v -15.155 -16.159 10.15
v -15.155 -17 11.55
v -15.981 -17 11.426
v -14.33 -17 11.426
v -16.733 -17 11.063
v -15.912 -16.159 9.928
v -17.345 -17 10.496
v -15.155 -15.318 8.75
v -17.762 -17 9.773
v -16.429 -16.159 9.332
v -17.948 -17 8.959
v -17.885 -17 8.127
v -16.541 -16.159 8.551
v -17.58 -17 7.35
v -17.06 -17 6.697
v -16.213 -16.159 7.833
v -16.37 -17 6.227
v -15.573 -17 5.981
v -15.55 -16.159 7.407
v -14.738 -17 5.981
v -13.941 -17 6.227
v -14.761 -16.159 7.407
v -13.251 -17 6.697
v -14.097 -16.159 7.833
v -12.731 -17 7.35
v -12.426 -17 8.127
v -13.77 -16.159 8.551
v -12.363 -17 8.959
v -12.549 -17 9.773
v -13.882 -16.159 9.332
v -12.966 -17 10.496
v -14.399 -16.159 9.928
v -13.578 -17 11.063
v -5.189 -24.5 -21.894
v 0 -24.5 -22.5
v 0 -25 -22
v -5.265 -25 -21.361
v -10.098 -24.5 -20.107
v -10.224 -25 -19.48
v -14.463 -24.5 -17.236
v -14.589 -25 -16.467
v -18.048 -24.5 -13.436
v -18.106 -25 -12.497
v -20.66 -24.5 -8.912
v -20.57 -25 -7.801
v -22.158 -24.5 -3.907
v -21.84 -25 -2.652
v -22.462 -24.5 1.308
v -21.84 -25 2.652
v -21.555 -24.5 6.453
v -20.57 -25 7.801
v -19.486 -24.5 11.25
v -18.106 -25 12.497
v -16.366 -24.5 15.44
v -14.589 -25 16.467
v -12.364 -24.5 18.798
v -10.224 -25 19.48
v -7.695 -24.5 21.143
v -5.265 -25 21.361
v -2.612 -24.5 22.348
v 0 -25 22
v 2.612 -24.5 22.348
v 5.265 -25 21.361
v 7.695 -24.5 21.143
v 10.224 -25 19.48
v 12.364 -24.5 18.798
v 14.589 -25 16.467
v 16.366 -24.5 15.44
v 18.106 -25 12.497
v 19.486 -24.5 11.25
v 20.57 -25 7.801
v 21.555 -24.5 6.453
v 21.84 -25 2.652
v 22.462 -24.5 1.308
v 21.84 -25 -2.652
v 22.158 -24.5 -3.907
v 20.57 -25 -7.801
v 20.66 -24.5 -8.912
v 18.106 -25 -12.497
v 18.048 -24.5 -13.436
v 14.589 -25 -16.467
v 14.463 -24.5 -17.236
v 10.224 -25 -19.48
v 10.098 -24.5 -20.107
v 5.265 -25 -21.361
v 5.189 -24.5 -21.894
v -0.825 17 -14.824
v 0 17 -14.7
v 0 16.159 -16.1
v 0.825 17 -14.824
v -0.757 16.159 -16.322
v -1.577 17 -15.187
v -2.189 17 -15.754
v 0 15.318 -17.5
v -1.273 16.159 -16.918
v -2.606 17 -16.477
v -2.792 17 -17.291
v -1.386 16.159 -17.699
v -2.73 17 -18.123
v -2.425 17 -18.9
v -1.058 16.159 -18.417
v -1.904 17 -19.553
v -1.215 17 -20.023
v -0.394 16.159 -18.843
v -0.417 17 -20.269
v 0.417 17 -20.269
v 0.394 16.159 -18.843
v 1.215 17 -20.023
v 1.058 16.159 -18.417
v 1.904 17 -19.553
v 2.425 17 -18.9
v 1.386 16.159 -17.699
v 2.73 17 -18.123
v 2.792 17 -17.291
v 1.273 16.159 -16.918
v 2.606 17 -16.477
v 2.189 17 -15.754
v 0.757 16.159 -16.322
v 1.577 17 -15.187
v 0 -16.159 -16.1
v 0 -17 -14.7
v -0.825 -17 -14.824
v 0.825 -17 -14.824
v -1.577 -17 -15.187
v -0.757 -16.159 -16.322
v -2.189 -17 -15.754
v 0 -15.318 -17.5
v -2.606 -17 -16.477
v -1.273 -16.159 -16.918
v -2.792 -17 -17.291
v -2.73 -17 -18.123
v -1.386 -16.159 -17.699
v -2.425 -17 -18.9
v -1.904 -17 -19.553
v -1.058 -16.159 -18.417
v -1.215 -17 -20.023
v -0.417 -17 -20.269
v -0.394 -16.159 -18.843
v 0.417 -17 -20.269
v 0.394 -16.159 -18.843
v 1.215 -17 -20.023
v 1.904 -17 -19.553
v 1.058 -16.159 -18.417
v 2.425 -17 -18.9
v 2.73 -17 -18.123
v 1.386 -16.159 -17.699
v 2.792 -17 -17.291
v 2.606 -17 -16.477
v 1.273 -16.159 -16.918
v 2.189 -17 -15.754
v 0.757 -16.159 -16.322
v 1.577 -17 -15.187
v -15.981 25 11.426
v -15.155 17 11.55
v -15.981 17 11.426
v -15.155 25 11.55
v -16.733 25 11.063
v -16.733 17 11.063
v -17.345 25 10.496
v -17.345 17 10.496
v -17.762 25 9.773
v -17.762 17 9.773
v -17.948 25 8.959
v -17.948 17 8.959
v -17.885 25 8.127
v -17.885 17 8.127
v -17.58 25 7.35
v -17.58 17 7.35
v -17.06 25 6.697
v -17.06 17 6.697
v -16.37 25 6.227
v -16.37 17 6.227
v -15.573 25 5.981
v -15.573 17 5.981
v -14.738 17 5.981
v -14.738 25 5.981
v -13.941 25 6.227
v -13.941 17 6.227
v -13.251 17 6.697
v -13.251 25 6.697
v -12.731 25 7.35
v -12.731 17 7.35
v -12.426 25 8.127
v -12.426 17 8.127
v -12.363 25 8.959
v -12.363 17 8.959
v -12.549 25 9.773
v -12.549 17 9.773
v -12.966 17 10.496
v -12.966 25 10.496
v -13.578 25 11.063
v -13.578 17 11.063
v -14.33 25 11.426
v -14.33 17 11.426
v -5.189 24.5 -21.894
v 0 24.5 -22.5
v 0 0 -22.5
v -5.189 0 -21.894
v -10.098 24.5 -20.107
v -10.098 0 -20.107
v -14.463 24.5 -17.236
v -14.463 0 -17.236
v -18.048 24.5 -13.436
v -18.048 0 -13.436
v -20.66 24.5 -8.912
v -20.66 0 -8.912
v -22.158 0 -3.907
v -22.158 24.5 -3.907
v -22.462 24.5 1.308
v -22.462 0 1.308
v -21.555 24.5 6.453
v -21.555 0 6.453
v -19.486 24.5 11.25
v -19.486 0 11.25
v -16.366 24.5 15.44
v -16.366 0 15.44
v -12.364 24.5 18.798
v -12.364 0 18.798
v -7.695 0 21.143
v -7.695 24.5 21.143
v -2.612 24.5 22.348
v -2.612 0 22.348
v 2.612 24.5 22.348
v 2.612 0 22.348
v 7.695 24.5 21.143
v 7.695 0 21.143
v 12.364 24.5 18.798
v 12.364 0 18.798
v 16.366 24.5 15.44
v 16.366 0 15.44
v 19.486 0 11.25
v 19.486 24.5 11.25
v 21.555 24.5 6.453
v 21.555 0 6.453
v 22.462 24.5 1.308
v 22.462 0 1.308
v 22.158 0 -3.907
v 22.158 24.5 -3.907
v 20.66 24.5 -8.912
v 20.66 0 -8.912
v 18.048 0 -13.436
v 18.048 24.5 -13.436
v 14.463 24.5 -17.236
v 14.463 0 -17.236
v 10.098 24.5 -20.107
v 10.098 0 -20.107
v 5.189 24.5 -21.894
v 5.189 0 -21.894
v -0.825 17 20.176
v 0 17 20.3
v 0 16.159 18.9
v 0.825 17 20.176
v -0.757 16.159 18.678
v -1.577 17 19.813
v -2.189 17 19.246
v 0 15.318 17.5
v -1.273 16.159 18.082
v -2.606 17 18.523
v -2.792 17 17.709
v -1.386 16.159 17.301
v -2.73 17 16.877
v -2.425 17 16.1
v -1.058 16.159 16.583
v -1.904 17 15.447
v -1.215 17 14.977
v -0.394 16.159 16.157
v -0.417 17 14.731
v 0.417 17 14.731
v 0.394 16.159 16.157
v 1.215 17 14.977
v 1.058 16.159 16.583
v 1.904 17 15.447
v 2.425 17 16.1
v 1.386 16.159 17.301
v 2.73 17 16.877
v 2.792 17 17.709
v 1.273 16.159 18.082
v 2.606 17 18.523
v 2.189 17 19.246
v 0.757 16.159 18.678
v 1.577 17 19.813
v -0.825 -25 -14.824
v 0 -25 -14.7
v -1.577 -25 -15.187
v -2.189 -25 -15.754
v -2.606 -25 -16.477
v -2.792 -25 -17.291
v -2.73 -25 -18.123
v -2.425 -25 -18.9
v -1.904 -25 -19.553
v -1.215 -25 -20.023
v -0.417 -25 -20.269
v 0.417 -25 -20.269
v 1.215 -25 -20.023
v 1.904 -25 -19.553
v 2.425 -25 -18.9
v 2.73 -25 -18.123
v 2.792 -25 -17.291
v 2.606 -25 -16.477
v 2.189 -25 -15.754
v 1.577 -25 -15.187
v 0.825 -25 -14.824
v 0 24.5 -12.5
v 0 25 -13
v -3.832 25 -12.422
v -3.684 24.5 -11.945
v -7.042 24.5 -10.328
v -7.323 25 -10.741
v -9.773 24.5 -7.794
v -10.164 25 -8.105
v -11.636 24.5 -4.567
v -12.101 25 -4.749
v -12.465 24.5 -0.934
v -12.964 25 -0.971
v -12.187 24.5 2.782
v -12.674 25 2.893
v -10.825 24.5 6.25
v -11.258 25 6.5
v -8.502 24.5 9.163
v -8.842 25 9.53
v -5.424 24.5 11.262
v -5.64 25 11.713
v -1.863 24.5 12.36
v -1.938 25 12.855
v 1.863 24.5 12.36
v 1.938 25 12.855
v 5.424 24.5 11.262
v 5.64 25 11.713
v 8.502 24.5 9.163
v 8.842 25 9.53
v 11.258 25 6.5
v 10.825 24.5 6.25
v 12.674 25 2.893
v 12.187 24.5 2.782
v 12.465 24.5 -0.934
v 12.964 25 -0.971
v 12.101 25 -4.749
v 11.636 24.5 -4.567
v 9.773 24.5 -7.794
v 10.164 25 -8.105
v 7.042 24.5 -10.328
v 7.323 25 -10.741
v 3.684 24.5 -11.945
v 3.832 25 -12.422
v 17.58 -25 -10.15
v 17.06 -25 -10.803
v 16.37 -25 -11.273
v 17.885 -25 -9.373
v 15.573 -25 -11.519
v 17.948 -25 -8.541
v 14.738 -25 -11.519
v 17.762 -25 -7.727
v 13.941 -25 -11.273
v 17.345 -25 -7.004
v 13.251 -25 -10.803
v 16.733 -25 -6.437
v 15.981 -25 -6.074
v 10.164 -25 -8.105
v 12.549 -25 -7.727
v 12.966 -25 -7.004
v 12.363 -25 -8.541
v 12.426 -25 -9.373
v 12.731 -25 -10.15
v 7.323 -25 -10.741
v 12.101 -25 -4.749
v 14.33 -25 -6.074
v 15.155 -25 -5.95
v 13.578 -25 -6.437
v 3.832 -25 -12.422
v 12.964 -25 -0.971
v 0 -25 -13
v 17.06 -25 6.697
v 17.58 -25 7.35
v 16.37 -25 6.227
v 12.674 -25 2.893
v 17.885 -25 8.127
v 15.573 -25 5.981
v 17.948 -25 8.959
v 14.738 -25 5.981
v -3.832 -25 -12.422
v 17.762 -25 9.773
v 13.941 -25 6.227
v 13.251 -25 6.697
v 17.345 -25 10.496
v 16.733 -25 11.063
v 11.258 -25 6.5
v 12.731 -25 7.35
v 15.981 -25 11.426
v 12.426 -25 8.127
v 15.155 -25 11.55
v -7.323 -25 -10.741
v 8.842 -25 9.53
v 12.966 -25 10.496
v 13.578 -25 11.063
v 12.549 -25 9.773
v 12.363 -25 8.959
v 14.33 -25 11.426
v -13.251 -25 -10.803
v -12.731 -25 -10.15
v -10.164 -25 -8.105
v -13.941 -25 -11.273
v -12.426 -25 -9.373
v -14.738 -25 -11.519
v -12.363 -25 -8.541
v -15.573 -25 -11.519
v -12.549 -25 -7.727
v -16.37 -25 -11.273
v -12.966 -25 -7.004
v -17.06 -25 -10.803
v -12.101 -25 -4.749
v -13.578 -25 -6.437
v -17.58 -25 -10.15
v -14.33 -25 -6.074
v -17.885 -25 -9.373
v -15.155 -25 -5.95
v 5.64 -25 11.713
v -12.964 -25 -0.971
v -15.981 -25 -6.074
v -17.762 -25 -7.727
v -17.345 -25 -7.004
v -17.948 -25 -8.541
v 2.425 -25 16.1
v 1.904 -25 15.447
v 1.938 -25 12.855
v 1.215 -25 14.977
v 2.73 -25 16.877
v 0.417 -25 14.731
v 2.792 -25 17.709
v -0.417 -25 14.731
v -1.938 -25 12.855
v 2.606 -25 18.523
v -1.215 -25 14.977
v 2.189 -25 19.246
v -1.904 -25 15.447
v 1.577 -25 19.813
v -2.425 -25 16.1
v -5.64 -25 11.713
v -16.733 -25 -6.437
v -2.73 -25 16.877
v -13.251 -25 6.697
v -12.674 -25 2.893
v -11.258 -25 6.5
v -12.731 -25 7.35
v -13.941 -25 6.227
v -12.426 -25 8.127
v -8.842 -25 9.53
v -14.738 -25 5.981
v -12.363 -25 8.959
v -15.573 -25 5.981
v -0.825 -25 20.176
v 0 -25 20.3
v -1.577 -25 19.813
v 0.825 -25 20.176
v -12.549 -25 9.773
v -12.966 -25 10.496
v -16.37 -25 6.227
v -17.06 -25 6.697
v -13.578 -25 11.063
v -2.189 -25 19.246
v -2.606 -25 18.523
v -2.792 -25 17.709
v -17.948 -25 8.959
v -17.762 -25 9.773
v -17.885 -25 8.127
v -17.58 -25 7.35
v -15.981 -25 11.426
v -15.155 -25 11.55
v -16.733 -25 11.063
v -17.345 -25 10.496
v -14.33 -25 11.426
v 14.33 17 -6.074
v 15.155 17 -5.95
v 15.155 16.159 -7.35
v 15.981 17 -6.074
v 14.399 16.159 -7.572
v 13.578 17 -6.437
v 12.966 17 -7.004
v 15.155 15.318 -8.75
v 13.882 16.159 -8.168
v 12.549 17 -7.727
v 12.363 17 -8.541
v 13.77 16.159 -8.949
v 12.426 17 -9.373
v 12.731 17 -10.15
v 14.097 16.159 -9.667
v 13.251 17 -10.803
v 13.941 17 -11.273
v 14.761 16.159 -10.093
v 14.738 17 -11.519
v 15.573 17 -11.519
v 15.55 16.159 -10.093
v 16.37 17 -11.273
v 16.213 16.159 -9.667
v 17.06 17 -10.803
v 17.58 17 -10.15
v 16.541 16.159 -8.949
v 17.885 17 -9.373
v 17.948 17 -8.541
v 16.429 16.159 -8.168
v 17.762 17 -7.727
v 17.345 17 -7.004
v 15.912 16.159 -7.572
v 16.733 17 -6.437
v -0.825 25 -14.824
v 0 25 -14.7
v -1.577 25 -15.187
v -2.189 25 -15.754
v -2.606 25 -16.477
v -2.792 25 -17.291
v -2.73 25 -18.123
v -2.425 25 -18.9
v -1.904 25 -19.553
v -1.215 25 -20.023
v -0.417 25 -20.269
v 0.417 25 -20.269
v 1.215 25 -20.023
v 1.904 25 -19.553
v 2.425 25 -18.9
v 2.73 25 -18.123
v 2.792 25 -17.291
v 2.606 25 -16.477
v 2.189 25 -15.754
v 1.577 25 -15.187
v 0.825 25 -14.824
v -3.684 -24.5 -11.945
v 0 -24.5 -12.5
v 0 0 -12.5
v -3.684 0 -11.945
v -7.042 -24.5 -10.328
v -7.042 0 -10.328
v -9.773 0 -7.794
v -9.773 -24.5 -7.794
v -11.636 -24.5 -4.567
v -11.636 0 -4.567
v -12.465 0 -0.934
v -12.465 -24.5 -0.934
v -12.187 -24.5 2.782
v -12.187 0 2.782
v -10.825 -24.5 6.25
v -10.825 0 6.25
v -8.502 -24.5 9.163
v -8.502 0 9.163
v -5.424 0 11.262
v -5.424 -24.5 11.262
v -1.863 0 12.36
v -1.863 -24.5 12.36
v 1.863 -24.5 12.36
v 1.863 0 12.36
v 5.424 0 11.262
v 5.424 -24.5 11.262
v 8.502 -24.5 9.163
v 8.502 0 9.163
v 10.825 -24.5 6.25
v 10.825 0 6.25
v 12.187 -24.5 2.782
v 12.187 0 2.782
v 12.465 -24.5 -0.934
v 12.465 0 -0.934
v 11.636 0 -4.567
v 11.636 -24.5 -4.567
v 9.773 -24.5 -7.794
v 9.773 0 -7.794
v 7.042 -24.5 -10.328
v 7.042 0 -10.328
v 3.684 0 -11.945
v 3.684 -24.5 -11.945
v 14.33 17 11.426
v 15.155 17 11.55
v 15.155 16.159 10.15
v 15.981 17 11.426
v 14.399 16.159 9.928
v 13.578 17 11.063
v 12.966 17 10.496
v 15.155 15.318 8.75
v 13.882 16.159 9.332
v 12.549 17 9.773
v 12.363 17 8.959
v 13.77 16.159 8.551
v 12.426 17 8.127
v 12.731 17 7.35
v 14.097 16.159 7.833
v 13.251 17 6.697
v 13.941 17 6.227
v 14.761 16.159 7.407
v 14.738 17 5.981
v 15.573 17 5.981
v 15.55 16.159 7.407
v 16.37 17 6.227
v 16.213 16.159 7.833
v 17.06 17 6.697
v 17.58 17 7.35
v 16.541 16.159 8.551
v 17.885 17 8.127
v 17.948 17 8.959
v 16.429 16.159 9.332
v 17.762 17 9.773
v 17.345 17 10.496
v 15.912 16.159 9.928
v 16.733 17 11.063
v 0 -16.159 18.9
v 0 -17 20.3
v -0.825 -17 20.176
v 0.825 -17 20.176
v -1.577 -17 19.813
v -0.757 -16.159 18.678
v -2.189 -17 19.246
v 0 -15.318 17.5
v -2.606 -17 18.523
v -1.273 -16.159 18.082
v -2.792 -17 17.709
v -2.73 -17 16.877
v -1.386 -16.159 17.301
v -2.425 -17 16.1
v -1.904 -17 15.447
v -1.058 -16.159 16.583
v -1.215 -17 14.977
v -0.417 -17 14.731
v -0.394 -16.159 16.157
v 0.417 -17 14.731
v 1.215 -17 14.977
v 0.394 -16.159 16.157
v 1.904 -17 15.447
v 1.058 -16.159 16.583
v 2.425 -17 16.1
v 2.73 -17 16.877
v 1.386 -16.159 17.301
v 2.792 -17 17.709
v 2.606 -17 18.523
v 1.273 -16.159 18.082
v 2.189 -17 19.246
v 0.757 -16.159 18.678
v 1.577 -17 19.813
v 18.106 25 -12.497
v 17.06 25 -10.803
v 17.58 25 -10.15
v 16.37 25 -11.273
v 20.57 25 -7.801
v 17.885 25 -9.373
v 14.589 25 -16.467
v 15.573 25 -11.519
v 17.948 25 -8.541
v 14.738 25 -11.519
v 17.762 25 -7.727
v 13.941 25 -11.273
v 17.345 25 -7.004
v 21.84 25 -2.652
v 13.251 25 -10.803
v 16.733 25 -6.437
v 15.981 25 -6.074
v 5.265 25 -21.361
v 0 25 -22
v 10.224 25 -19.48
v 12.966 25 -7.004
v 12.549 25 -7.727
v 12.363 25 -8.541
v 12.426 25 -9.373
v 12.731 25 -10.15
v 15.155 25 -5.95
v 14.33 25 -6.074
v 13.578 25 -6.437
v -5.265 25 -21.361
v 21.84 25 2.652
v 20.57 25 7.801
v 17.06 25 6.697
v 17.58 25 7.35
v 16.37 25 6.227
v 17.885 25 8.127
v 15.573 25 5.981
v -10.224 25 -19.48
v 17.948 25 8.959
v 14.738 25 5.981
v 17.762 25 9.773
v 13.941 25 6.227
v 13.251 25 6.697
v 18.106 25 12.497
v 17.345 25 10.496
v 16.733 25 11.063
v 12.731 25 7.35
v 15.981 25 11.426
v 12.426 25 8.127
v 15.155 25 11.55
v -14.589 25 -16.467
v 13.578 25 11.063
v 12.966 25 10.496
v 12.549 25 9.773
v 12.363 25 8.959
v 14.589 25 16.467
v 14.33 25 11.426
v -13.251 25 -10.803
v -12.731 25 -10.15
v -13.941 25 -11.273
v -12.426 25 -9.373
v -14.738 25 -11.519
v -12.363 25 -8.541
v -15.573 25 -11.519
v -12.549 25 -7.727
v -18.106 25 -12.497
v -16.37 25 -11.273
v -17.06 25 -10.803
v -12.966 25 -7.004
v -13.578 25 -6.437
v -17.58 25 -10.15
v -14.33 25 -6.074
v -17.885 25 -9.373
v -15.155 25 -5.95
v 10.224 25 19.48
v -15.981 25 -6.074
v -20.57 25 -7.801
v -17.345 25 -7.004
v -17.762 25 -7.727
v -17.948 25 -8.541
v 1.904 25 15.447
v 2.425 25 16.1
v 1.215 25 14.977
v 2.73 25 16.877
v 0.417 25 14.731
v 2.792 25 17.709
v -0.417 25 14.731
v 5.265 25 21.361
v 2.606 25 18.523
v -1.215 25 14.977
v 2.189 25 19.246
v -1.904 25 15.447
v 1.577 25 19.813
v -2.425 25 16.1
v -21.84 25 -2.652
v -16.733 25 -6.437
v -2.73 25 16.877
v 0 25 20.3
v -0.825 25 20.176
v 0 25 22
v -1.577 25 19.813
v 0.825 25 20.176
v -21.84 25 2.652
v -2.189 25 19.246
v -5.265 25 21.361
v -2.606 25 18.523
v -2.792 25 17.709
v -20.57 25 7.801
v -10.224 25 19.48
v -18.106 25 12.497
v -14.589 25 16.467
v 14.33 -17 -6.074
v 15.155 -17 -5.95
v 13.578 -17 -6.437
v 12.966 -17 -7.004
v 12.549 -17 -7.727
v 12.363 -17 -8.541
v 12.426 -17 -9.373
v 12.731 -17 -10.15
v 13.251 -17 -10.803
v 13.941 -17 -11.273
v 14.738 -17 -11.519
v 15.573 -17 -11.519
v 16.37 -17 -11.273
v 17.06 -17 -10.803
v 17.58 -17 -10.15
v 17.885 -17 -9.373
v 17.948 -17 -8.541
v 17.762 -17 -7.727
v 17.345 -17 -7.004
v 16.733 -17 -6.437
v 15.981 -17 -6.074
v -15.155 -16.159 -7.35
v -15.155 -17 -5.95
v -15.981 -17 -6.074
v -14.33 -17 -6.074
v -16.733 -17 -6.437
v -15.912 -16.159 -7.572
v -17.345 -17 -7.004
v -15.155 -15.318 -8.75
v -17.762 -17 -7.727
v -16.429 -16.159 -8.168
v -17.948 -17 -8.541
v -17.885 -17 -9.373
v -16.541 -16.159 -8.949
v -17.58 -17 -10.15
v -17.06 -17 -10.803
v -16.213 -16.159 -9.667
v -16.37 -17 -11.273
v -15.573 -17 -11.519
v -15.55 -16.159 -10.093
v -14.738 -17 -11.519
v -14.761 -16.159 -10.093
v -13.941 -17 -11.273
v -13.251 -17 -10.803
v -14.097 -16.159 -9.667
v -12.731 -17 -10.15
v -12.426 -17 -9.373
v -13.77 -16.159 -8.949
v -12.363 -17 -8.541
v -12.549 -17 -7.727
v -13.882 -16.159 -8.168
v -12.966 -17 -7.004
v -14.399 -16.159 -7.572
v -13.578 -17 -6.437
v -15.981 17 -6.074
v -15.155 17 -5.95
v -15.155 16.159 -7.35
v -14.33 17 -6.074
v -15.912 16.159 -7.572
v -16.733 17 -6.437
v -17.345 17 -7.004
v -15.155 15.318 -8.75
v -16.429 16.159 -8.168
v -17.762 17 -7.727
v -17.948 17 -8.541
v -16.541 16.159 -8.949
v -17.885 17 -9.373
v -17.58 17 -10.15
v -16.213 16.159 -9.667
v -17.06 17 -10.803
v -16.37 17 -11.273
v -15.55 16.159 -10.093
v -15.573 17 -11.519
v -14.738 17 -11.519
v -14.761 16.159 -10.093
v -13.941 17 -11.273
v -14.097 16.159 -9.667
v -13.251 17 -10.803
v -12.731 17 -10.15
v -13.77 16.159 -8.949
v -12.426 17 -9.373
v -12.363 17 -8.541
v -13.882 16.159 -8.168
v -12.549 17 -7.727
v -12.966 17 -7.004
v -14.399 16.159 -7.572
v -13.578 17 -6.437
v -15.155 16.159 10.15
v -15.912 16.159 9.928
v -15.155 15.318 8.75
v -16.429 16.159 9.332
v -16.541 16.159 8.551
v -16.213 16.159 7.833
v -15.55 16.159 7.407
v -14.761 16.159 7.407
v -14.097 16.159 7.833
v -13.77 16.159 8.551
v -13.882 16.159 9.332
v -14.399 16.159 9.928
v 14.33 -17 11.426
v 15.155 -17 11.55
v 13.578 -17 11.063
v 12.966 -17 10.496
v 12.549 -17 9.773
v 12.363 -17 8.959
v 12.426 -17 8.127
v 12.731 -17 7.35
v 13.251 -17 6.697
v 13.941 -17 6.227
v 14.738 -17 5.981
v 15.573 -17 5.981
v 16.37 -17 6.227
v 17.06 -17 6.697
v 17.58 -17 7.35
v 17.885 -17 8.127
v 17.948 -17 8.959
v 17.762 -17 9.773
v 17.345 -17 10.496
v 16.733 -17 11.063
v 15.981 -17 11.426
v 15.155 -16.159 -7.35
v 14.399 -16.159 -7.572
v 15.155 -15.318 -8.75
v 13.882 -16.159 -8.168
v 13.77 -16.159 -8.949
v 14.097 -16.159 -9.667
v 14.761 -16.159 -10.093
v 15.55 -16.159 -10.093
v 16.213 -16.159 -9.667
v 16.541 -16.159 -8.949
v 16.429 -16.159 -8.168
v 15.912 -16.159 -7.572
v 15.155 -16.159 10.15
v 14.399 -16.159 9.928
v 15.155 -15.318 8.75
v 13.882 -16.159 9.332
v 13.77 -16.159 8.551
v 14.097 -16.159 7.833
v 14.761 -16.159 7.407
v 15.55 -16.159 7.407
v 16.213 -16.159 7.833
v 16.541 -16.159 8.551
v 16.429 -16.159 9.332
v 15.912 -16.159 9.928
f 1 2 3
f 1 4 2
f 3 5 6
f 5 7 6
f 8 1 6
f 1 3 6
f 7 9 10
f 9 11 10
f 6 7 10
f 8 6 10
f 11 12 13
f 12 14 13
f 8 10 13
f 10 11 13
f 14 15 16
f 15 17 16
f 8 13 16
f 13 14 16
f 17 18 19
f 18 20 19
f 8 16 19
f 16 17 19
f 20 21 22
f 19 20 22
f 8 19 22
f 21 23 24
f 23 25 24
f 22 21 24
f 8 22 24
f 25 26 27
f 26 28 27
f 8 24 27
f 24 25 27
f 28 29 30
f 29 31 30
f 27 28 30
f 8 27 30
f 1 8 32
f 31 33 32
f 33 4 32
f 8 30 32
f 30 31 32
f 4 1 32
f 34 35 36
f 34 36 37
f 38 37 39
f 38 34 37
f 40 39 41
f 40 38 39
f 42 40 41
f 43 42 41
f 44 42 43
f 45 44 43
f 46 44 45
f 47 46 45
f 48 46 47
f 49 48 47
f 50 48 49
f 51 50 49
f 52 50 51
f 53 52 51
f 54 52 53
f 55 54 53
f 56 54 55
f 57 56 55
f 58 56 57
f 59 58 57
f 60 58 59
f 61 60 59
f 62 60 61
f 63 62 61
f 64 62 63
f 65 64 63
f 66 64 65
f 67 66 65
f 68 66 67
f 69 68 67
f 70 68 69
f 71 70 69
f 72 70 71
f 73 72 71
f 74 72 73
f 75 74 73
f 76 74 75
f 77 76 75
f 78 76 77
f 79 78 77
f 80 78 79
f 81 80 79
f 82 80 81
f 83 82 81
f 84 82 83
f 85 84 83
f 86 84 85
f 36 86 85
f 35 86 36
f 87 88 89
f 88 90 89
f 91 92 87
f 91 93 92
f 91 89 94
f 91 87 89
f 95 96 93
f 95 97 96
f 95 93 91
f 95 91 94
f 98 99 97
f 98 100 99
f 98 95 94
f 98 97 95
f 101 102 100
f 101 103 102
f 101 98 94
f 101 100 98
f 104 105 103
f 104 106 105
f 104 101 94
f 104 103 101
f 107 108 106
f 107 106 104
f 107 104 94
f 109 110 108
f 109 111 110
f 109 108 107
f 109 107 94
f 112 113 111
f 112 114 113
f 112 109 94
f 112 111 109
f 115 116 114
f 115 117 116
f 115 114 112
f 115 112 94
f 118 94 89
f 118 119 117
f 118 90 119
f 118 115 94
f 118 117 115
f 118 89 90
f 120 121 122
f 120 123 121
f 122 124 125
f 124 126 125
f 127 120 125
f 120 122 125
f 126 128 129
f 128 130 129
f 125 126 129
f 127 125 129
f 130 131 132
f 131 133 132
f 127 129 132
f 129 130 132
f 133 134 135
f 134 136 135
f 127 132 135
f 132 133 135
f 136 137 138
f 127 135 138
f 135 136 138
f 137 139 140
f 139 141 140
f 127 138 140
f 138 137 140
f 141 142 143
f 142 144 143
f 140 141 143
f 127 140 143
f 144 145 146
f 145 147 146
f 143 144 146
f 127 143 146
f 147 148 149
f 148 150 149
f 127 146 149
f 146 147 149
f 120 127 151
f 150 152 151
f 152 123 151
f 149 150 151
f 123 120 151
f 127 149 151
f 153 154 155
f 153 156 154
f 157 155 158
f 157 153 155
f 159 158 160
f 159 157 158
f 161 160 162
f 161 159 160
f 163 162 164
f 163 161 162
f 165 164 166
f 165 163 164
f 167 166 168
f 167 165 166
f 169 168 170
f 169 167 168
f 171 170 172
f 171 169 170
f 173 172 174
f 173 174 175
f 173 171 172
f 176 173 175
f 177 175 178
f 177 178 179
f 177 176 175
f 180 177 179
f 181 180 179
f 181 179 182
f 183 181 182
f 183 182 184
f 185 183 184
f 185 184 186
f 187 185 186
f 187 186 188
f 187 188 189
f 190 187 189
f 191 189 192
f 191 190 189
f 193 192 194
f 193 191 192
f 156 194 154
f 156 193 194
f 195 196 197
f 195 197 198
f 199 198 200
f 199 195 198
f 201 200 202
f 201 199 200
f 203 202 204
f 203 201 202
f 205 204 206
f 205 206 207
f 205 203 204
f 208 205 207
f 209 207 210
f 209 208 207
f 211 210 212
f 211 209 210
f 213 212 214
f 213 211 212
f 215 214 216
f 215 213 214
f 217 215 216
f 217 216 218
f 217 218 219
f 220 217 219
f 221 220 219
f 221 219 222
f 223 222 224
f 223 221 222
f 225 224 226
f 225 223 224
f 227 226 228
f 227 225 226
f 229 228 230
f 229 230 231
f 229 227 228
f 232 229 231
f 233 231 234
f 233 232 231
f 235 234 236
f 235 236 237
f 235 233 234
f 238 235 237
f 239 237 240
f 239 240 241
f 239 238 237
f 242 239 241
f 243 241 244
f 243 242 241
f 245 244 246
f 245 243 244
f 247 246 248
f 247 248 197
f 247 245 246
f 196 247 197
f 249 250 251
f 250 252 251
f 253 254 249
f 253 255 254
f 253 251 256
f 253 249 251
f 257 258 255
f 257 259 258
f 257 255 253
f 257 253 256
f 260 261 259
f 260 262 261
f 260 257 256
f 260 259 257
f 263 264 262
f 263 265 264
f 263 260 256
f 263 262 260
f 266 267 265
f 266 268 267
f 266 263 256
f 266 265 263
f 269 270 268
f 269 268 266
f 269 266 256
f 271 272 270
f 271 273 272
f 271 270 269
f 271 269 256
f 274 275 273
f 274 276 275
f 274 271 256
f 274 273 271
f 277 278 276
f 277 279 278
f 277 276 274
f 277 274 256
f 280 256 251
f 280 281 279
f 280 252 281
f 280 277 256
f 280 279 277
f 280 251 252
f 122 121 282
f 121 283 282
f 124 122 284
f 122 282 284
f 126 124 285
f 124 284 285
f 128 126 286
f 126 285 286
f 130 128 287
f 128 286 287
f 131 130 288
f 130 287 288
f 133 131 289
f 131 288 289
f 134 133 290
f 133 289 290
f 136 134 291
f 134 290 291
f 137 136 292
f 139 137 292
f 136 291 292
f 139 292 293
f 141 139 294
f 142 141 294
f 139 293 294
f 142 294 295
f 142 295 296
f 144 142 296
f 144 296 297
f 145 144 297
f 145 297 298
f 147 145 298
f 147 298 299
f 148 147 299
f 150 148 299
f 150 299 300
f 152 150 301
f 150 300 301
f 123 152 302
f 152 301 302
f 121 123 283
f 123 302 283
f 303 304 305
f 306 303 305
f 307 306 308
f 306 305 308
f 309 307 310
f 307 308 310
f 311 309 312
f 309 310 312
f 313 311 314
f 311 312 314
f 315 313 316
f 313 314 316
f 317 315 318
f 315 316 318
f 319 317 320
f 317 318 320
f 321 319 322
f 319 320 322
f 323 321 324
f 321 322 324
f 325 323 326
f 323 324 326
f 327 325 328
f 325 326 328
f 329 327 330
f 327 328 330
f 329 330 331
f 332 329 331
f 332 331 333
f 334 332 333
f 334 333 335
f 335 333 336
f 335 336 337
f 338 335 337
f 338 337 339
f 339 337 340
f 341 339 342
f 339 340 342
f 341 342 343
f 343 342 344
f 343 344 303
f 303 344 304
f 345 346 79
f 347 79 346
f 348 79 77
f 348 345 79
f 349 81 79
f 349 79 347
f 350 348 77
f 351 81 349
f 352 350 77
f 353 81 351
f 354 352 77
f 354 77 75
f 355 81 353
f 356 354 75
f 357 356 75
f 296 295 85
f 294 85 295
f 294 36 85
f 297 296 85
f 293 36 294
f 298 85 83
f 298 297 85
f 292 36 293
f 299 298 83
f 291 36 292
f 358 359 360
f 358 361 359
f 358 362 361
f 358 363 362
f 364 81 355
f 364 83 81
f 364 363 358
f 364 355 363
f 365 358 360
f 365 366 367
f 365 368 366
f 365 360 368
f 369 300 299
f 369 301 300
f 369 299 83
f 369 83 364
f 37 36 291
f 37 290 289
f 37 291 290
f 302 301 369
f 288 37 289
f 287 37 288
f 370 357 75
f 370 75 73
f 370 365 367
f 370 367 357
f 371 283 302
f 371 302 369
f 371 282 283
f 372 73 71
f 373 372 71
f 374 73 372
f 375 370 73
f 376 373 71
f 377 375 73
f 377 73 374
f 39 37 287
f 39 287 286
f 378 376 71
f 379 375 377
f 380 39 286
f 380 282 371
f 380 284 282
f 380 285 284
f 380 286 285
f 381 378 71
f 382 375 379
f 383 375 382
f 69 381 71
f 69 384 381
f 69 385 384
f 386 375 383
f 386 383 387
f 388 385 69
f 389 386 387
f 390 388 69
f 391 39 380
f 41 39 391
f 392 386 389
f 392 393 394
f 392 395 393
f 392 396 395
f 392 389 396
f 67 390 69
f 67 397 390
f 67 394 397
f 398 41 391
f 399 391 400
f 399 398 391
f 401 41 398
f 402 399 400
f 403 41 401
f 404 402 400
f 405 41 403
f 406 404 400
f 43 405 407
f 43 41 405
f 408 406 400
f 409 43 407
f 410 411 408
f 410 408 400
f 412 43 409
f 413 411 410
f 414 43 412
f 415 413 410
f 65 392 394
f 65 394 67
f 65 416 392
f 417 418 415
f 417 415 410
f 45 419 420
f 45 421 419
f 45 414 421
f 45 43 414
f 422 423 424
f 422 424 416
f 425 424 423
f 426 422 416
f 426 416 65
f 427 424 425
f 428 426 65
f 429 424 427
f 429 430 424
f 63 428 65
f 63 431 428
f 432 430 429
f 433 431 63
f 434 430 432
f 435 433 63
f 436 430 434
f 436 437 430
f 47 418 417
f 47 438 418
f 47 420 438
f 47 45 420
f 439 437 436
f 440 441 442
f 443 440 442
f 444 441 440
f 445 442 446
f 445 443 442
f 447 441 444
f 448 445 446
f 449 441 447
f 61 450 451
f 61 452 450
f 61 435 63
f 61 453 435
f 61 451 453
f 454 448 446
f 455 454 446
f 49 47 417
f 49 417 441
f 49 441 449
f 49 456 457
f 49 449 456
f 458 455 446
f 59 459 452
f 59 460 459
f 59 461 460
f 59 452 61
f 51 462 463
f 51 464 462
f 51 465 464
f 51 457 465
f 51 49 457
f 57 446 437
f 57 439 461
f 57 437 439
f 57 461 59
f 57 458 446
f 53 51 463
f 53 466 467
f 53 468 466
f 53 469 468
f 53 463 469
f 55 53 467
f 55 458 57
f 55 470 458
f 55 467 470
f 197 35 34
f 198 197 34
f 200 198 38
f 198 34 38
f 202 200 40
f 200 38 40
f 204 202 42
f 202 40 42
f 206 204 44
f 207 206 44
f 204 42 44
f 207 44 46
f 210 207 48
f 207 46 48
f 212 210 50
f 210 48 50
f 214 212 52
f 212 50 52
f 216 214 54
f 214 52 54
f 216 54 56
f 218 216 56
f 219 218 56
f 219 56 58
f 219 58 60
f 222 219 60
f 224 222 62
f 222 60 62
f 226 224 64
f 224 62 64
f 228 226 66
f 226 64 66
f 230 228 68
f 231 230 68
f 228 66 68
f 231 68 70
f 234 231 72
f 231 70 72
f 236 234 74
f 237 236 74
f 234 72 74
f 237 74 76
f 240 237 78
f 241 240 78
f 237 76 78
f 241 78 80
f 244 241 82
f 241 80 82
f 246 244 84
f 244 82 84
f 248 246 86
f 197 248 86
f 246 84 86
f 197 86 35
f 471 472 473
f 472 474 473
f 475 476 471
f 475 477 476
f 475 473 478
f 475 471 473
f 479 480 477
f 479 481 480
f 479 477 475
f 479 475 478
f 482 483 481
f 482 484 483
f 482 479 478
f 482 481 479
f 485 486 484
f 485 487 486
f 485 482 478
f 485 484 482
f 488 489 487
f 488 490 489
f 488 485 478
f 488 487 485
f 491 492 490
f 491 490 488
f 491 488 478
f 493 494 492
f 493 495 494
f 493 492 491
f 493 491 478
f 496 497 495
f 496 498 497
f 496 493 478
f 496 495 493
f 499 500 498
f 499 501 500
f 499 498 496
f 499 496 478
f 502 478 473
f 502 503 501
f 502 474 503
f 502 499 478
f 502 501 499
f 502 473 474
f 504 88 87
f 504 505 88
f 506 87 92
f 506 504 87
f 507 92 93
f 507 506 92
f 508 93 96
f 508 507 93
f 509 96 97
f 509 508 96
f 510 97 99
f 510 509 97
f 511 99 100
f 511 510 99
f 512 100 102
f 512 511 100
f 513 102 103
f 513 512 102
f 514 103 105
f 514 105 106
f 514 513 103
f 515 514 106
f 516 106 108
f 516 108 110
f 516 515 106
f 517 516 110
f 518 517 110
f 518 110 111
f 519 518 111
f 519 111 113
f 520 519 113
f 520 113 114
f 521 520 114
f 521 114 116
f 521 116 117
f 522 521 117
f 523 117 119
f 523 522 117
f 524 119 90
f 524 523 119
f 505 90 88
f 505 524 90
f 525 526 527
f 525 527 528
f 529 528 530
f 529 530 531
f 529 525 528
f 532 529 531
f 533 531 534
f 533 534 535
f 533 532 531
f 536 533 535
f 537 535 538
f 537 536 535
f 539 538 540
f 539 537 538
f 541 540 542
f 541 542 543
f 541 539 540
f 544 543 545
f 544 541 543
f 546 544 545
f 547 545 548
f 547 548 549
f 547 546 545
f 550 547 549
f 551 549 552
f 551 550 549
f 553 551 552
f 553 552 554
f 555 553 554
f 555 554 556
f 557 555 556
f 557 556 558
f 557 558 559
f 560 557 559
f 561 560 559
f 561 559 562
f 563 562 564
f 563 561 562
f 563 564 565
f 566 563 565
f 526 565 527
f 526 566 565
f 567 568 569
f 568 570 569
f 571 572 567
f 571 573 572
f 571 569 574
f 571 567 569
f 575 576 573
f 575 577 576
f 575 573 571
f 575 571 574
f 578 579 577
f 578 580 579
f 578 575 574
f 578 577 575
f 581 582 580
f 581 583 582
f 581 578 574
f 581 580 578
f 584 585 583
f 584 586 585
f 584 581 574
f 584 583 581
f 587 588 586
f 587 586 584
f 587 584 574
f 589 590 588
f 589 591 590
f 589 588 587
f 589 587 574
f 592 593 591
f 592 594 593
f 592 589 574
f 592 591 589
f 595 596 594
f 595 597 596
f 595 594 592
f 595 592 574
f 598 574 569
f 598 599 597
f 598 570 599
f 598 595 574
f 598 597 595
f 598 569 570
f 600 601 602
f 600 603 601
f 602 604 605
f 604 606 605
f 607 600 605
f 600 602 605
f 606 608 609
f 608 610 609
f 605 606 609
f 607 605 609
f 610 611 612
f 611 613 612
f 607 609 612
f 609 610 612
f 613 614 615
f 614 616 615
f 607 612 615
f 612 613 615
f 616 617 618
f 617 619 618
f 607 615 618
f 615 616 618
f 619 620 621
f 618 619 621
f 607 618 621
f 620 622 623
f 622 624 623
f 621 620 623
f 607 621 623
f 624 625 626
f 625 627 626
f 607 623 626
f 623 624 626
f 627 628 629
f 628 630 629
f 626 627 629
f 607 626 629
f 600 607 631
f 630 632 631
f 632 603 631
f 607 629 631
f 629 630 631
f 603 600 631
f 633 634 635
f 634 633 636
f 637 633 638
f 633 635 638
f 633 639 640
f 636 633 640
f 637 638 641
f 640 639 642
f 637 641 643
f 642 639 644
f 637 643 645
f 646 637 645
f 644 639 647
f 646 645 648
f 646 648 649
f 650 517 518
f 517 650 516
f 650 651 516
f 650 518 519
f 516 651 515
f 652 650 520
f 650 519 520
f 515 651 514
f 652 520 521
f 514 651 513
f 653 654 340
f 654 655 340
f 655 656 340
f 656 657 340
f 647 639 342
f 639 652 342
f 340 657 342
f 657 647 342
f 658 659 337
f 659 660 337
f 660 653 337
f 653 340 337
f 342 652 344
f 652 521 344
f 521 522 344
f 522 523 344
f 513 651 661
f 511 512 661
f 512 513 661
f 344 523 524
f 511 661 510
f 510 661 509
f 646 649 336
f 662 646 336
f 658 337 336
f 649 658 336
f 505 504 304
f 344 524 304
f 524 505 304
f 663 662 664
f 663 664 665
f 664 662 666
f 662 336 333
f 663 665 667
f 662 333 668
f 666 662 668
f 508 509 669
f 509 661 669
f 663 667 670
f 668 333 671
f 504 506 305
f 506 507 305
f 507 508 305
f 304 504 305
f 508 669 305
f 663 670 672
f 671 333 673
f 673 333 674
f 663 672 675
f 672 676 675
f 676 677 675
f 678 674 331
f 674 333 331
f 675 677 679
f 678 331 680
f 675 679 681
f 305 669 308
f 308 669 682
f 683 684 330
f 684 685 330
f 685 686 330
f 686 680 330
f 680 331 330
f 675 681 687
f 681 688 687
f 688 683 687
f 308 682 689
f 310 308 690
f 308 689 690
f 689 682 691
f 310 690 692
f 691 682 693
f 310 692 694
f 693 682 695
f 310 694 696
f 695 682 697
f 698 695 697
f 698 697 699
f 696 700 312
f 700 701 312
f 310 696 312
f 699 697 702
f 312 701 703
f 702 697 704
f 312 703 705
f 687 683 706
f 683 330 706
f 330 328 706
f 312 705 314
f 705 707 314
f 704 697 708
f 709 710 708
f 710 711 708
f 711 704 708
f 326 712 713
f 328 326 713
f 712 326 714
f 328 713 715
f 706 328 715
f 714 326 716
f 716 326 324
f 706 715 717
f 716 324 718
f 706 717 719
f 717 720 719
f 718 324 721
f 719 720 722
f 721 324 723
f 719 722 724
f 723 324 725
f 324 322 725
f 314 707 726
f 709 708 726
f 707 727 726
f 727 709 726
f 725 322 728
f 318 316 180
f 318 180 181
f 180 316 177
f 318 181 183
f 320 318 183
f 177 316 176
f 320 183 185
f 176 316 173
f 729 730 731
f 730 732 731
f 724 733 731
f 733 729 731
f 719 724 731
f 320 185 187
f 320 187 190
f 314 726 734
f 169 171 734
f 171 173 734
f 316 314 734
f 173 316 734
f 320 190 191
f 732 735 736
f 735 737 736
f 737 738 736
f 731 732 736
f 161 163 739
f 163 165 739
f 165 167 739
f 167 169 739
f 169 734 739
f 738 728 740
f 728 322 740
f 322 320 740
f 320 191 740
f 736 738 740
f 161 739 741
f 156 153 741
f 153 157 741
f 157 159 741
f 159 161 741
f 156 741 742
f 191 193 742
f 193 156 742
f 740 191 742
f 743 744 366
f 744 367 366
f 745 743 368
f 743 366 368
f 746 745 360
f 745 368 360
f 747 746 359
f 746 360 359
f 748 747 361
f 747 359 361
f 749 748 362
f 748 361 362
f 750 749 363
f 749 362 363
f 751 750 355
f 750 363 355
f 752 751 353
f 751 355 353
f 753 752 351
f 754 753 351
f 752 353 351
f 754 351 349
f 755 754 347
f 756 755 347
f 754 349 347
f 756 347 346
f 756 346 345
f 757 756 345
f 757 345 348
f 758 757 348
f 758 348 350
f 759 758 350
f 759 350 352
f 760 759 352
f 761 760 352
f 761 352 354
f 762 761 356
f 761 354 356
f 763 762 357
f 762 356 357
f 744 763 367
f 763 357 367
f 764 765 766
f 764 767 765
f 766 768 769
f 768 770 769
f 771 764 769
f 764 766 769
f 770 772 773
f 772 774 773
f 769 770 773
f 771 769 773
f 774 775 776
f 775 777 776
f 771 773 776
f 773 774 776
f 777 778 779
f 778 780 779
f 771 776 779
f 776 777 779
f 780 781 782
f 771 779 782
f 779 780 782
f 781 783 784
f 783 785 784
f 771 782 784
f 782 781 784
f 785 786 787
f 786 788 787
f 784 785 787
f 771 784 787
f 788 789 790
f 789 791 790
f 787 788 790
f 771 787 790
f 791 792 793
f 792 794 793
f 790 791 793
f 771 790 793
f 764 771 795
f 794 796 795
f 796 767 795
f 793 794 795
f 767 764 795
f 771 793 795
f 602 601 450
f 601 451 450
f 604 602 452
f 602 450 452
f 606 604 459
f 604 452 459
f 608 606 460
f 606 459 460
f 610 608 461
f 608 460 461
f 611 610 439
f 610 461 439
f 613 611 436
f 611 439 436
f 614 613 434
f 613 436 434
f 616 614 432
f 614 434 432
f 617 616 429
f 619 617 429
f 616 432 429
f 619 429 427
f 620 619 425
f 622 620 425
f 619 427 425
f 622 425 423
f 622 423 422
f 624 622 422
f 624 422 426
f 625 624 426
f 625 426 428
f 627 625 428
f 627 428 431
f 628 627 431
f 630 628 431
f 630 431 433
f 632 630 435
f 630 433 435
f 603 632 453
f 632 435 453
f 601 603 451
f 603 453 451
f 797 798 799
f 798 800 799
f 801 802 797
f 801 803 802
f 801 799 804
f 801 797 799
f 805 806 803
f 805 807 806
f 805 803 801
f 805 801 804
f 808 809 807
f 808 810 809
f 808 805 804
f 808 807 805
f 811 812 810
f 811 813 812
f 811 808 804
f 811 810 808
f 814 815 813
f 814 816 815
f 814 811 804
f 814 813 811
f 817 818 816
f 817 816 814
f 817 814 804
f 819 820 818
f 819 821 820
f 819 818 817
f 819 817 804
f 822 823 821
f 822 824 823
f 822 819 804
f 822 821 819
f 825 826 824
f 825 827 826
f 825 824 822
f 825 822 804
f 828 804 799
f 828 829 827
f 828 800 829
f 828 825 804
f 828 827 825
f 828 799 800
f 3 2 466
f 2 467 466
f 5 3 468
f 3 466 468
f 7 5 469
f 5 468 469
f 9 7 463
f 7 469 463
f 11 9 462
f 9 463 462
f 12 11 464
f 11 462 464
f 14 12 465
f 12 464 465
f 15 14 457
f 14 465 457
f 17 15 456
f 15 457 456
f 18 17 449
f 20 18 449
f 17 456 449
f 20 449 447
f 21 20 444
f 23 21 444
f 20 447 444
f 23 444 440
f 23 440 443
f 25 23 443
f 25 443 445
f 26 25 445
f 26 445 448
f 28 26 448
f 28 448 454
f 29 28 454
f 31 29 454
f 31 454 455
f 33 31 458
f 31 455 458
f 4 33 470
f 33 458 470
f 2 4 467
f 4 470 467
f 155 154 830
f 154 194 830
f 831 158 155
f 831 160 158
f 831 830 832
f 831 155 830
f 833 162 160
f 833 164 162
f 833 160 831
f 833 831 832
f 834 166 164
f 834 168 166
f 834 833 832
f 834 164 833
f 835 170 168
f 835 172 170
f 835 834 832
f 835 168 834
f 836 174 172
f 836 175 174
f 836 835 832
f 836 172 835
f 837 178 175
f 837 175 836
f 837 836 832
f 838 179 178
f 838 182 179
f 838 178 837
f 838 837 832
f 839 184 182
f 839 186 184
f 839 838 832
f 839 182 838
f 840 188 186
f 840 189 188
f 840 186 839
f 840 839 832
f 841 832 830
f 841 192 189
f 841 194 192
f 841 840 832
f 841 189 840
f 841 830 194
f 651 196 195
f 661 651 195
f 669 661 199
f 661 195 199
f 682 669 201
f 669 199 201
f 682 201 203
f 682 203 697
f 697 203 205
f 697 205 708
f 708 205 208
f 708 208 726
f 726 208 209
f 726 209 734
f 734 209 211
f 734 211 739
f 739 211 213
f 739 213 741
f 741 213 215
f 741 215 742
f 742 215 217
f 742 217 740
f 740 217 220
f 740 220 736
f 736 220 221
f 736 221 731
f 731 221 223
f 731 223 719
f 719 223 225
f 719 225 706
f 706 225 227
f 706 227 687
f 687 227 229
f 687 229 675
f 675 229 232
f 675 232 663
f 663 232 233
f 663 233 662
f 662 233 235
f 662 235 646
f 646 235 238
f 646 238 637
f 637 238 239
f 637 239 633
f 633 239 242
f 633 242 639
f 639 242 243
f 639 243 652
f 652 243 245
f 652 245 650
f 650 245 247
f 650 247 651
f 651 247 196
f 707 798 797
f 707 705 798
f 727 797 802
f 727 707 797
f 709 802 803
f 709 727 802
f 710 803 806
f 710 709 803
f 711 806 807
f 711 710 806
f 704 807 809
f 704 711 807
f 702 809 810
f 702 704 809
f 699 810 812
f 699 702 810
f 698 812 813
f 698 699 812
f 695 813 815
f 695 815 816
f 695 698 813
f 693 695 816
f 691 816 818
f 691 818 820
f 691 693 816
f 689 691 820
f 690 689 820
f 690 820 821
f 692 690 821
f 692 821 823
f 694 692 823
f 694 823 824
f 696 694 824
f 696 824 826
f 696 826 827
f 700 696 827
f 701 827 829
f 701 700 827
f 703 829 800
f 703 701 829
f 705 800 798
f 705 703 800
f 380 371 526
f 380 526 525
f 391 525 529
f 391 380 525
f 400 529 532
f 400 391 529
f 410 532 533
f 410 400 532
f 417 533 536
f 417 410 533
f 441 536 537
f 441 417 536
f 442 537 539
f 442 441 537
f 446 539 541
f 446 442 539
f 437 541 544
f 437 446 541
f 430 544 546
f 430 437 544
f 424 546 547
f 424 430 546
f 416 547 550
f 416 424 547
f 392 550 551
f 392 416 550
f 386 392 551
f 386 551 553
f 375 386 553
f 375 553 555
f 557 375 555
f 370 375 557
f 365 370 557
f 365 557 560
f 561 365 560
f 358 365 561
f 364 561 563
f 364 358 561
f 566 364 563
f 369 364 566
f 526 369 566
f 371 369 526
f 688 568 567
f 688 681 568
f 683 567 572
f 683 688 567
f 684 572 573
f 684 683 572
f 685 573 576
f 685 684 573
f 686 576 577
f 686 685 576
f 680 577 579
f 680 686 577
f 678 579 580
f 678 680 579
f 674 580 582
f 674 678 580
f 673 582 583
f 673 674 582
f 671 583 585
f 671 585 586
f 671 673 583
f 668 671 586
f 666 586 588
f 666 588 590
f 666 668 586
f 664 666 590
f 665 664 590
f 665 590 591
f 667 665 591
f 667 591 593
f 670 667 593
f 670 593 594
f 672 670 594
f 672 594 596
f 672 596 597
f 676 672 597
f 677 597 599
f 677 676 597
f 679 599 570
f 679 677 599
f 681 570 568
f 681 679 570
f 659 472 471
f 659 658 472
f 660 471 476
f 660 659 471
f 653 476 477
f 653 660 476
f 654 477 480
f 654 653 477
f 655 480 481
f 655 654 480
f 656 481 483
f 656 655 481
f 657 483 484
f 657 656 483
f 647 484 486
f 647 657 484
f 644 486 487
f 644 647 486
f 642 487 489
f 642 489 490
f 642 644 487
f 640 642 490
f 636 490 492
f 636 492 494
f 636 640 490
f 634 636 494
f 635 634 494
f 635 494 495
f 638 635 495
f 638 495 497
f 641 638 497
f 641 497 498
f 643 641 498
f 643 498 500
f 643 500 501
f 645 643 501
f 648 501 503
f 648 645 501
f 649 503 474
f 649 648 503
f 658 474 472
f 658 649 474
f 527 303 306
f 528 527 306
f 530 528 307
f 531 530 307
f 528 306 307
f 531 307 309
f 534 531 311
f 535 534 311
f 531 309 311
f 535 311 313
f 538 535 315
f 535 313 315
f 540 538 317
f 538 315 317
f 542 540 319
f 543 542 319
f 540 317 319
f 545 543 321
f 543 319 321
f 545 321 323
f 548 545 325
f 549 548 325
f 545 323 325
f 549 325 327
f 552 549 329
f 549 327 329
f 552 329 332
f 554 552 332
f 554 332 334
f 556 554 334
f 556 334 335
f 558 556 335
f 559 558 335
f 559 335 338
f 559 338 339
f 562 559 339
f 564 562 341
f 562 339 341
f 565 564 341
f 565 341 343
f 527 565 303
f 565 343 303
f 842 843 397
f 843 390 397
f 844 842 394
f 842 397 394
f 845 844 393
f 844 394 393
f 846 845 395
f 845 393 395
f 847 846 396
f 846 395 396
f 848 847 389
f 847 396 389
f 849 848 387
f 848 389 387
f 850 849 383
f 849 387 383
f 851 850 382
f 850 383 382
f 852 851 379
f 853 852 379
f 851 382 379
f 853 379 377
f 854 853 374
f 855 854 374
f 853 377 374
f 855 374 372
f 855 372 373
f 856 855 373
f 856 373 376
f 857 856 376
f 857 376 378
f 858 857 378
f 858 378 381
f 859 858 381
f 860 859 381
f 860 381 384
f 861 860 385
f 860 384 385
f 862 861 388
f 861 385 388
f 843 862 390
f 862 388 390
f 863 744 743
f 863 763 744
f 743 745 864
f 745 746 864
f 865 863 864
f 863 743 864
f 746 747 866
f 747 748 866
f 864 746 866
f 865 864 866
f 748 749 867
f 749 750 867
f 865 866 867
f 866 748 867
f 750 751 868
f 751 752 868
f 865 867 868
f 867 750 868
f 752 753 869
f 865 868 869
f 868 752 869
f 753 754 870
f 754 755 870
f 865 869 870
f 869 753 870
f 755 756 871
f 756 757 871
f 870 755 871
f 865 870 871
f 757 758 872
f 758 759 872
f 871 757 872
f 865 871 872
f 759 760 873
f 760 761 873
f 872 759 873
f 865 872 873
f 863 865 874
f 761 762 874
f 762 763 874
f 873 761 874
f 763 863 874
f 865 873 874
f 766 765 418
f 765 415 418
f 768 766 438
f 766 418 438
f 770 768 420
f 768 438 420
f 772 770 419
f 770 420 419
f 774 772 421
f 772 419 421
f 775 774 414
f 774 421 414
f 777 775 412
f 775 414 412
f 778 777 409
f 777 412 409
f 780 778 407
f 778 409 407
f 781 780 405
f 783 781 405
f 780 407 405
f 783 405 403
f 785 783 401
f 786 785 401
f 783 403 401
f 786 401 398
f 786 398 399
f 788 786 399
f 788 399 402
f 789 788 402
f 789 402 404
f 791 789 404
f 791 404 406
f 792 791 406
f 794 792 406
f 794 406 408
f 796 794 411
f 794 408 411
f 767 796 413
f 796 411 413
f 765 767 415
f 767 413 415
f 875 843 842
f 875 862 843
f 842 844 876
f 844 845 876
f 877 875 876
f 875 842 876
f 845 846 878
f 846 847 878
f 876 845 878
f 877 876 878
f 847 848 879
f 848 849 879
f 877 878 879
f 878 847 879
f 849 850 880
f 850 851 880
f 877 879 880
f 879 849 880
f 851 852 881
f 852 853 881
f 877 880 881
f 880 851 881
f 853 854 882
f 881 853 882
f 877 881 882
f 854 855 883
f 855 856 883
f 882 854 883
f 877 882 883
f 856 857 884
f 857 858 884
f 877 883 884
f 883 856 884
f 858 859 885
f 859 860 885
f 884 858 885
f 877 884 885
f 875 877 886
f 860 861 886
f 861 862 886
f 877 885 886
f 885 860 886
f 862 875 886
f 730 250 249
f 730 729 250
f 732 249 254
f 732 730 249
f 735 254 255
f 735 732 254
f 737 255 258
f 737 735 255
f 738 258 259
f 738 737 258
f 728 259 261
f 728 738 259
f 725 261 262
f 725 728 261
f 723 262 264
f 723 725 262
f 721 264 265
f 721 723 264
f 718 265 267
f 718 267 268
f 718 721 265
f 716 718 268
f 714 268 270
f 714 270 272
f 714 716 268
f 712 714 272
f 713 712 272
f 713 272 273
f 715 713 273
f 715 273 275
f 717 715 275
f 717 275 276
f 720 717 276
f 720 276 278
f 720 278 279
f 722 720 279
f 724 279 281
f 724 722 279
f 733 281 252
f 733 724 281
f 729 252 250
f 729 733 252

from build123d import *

# Parameters (mm, degrees)
SKETCH2_W                           = 10
SKETCH2_H                           = 25
F_5_6_5_6_DIAMETER_HOLE1_AT_2_COUNT = 2
F_5_6_5_6_DIAMETER_HOLE1_AT_2_PITCH = 17.5
F_5_6_5_6_DIAMETER_HOLE1_AT_3_COUNT = 2
F_5_6_5_6_DIAMETER_HOLE1_AT_3_PITCH = 30.310889132
F_5_6_5_6_DIAMETER_HOLE1_AT_4_COUNT = 2
F_5_6_5_6_DIAMETER_HOLE1_AT_4_PITCH = 35
F_5_6_5_6_DIAMETER_HOLE1_AT_5_COUNT = 2
F_5_6_5_6_DIAMETER_HOLE1_AT_5_PITCH = 30.310889132
F_5_6_5_6_DIAMETER_HOLE1_AT_6_COUNT = 2
F_5_6_5_6_DIAMETER_HOLE1_AT_6_PITCH = 17.5
F_0_5MM_CHAMFER1_SIZE               = 0.5


with BuildPart() as part:
    # Sketch2 → Revolve1 (revolve)
    with BuildSketch(Plane.XY, mode=Mode.PRIVATE) as revolve1_sk:
        with Locations((17.5, 12.5)):
            Rectangle(SKETCH2_W, SKETCH2_H)
    revolve1 = revolve(revolve1_sk.sketch.rotate(Axis((0, 0, 0), (0, 1, 0)), 90), axis=Axis((0, 0, 0), (0, 1, 0)))

    # Sketch5 → Ø5.6 (5.6) Diameter Hole1 (revolve, cut)
    with BuildSketch(Plane(origin=(15.155444566, 25, 8.75), x_dir=(0, 0, 1), z_dir=(1, 0, 0))):
        Polygon((0, 0), (0, 9.682409733), (2.8, 8), (2.8, 0), align=None)
    f_5_6_5_6_diameter_hole1 = revolve(axis=Axis((15.155444566, 31.35, 8.75), (0, -1, 0)), mode=Mode.SUBTRACT)

    # Ø5.6 (5.6) Diameter Hole1 at 2: Ø5.6 (5.6) Diameter Hole1 ×2
    with Locations(*[Vector(-0.8660254037844417, 0, 0.49999999999999495) * (i * F_5_6_5_6_DIAMETER_HOLE1_AT_2_PITCH) for i in range(1, F_5_6_5_6_DIAMETER_HOLE1_AT_2_COUNT)]):
        add(f_5_6_5_6_diameter_hole1, mode=Mode.SUBTRACT)

    # Ø5.6 (5.6) Diameter Hole1 at 3: Ø5.6 (5.6) Diameter Hole1 ×2
    with Locations(*[(-i * F_5_6_5_6_DIAMETER_HOLE1_AT_3_PITCH, 0, 0) for i in range(1, F_5_6_5_6_DIAMETER_HOLE1_AT_3_COUNT)]):
        add(f_5_6_5_6_diameter_hole1, mode=Mode.SUBTRACT)

    # Ø5.6 (5.6) Diameter Hole1 at 4: Ø5.6 (5.6) Diameter Hole1 ×2
    with Locations(*[Vector(-0.8660254037844346, 0, -0.5000000000000072) * (i * F_5_6_5_6_DIAMETER_HOLE1_AT_4_PITCH) for i in range(1, F_5_6_5_6_DIAMETER_HOLE1_AT_4_COUNT)]):
        add(f_5_6_5_6_diameter_hole1, mode=Mode.SUBTRACT)

    # Ø5.6 (5.6) Diameter Hole1 at 5: Ø5.6 (5.6) Diameter Hole1 ×2
    with Locations(*[Vector(-0.49999999999999195, 0, -0.8660254037844433) * (i * F_5_6_5_6_DIAMETER_HOLE1_AT_5_PITCH) for i in range(1, F_5_6_5_6_DIAMETER_HOLE1_AT_5_COUNT)]):
        add(f_5_6_5_6_diameter_hole1, mode=Mode.SUBTRACT)

    # Ø5.6 (5.6) Diameter Hole1 at 6: Ø5.6 (5.6) Diameter Hole1 ×2
    with Locations(*[(0, 0, -i * F_5_6_5_6_DIAMETER_HOLE1_AT_6_PITCH) for i in range(1, F_5_6_5_6_DIAMETER_HOLE1_AT_6_COUNT)]):
        add(f_5_6_5_6_diameter_hole1, mode=Mode.SUBTRACT)

    # Mirror1: Revolve1, Ø5.6 (5.6) Diameter Hole1 across plane
    add(revolve1.mirror(Plane.ZX))
    add(f_5_6_5_6_diameter_hole1.mirror(Plane.ZX), mode=Mode.SUBTRACT)

    # Mirror1 copy 1 sketch → Mirror1 copy 1 (revolve, cut)
    with BuildSketch(Plane(origin=(0, -25, 17.5), x_dir=(0, 0, 1), z_dir=(1, 0, 0))):
        Polygon((0, 0), (0, -9.682409733), (2.8, -8), (2.8, 0), align=None)
    revolve(axis=Axis((0, -31.35, 17.5), (0, -1, 0)), mode=Mode.SUBTRACT)

    # Mirror1 copy 2 sketch → Mirror1 copy 2 (revolve, cut)
    with BuildSketch(Plane(origin=(-15.155444566, -25, 8.75), x_dir=(0, 0, 1), z_dir=(1, 0, 0))):
        Polygon((0, 0), (0, -9.682409733), (2.8, -8), (2.8, 0), align=None)
    revolve(axis=Axis((-15.155444566, -31.35, 8.75), (0, -1, 0)), mode=Mode.SUBTRACT)

    # Mirror1 copy 3 sketch → Mirror1 copy 3 (revolve, cut)
    with BuildSketch(Plane(origin=(-15.155444566, -25, -8.75), x_dir=(0, 0, 1), z_dir=(1, 0, 0))):
        Polygon((0, 0), (0, -9.682409733), (2.8, -8), (2.8, 0), align=None)
    revolve(axis=Axis((-15.155444566, -31.35, -8.75), (0, -1, 0)), mode=Mode.SUBTRACT)

    # Mirror1 copy 4 sketch → Mirror1 copy 4 (revolve, cut)
    with BuildSketch(Plane(origin=(0, -25, -17.5), x_dir=(0, 0, 1), z_dir=(1, 0, 0))):
        Polygon((0, 0), (0, -9.682409733), (2.8, -8), (2.8, 0), align=None)
    revolve(axis=Axis((0, -31.35, -17.5), (0, -1, 0)), mode=Mode.SUBTRACT)

    # Mirror1 copy 5 sketch → Mirror1 copy 5 (revolve, cut)
    with BuildSketch(Plane(origin=(15.155444566, -25, -8.75), x_dir=(0, 0, 1), z_dir=(1, 0, 0))):
        Polygon((0, 0), (0, -9.682409733), (2.8, -8), (2.8, 0), align=None)
    revolve(axis=Axis((15.155444566, -31.35, -8.75), (0, -1, 0)), mode=Mode.SUBTRACT)

    # 0,5mm Chamfer1
    f_0_5mm_chamfer1_edges = [part.edges().sort_by_distance(p)[0] for p in [
        (0, -25, 12.5),
        (0, -25, 22.5),
        (0, 25, 22.5),
        (0, 25, 12.5),
    ]]
    chamfer(f_0_5mm_chamfer1_edges, length=F_0_5MM_CHAMFER1_SIZE)


solid = part.part
